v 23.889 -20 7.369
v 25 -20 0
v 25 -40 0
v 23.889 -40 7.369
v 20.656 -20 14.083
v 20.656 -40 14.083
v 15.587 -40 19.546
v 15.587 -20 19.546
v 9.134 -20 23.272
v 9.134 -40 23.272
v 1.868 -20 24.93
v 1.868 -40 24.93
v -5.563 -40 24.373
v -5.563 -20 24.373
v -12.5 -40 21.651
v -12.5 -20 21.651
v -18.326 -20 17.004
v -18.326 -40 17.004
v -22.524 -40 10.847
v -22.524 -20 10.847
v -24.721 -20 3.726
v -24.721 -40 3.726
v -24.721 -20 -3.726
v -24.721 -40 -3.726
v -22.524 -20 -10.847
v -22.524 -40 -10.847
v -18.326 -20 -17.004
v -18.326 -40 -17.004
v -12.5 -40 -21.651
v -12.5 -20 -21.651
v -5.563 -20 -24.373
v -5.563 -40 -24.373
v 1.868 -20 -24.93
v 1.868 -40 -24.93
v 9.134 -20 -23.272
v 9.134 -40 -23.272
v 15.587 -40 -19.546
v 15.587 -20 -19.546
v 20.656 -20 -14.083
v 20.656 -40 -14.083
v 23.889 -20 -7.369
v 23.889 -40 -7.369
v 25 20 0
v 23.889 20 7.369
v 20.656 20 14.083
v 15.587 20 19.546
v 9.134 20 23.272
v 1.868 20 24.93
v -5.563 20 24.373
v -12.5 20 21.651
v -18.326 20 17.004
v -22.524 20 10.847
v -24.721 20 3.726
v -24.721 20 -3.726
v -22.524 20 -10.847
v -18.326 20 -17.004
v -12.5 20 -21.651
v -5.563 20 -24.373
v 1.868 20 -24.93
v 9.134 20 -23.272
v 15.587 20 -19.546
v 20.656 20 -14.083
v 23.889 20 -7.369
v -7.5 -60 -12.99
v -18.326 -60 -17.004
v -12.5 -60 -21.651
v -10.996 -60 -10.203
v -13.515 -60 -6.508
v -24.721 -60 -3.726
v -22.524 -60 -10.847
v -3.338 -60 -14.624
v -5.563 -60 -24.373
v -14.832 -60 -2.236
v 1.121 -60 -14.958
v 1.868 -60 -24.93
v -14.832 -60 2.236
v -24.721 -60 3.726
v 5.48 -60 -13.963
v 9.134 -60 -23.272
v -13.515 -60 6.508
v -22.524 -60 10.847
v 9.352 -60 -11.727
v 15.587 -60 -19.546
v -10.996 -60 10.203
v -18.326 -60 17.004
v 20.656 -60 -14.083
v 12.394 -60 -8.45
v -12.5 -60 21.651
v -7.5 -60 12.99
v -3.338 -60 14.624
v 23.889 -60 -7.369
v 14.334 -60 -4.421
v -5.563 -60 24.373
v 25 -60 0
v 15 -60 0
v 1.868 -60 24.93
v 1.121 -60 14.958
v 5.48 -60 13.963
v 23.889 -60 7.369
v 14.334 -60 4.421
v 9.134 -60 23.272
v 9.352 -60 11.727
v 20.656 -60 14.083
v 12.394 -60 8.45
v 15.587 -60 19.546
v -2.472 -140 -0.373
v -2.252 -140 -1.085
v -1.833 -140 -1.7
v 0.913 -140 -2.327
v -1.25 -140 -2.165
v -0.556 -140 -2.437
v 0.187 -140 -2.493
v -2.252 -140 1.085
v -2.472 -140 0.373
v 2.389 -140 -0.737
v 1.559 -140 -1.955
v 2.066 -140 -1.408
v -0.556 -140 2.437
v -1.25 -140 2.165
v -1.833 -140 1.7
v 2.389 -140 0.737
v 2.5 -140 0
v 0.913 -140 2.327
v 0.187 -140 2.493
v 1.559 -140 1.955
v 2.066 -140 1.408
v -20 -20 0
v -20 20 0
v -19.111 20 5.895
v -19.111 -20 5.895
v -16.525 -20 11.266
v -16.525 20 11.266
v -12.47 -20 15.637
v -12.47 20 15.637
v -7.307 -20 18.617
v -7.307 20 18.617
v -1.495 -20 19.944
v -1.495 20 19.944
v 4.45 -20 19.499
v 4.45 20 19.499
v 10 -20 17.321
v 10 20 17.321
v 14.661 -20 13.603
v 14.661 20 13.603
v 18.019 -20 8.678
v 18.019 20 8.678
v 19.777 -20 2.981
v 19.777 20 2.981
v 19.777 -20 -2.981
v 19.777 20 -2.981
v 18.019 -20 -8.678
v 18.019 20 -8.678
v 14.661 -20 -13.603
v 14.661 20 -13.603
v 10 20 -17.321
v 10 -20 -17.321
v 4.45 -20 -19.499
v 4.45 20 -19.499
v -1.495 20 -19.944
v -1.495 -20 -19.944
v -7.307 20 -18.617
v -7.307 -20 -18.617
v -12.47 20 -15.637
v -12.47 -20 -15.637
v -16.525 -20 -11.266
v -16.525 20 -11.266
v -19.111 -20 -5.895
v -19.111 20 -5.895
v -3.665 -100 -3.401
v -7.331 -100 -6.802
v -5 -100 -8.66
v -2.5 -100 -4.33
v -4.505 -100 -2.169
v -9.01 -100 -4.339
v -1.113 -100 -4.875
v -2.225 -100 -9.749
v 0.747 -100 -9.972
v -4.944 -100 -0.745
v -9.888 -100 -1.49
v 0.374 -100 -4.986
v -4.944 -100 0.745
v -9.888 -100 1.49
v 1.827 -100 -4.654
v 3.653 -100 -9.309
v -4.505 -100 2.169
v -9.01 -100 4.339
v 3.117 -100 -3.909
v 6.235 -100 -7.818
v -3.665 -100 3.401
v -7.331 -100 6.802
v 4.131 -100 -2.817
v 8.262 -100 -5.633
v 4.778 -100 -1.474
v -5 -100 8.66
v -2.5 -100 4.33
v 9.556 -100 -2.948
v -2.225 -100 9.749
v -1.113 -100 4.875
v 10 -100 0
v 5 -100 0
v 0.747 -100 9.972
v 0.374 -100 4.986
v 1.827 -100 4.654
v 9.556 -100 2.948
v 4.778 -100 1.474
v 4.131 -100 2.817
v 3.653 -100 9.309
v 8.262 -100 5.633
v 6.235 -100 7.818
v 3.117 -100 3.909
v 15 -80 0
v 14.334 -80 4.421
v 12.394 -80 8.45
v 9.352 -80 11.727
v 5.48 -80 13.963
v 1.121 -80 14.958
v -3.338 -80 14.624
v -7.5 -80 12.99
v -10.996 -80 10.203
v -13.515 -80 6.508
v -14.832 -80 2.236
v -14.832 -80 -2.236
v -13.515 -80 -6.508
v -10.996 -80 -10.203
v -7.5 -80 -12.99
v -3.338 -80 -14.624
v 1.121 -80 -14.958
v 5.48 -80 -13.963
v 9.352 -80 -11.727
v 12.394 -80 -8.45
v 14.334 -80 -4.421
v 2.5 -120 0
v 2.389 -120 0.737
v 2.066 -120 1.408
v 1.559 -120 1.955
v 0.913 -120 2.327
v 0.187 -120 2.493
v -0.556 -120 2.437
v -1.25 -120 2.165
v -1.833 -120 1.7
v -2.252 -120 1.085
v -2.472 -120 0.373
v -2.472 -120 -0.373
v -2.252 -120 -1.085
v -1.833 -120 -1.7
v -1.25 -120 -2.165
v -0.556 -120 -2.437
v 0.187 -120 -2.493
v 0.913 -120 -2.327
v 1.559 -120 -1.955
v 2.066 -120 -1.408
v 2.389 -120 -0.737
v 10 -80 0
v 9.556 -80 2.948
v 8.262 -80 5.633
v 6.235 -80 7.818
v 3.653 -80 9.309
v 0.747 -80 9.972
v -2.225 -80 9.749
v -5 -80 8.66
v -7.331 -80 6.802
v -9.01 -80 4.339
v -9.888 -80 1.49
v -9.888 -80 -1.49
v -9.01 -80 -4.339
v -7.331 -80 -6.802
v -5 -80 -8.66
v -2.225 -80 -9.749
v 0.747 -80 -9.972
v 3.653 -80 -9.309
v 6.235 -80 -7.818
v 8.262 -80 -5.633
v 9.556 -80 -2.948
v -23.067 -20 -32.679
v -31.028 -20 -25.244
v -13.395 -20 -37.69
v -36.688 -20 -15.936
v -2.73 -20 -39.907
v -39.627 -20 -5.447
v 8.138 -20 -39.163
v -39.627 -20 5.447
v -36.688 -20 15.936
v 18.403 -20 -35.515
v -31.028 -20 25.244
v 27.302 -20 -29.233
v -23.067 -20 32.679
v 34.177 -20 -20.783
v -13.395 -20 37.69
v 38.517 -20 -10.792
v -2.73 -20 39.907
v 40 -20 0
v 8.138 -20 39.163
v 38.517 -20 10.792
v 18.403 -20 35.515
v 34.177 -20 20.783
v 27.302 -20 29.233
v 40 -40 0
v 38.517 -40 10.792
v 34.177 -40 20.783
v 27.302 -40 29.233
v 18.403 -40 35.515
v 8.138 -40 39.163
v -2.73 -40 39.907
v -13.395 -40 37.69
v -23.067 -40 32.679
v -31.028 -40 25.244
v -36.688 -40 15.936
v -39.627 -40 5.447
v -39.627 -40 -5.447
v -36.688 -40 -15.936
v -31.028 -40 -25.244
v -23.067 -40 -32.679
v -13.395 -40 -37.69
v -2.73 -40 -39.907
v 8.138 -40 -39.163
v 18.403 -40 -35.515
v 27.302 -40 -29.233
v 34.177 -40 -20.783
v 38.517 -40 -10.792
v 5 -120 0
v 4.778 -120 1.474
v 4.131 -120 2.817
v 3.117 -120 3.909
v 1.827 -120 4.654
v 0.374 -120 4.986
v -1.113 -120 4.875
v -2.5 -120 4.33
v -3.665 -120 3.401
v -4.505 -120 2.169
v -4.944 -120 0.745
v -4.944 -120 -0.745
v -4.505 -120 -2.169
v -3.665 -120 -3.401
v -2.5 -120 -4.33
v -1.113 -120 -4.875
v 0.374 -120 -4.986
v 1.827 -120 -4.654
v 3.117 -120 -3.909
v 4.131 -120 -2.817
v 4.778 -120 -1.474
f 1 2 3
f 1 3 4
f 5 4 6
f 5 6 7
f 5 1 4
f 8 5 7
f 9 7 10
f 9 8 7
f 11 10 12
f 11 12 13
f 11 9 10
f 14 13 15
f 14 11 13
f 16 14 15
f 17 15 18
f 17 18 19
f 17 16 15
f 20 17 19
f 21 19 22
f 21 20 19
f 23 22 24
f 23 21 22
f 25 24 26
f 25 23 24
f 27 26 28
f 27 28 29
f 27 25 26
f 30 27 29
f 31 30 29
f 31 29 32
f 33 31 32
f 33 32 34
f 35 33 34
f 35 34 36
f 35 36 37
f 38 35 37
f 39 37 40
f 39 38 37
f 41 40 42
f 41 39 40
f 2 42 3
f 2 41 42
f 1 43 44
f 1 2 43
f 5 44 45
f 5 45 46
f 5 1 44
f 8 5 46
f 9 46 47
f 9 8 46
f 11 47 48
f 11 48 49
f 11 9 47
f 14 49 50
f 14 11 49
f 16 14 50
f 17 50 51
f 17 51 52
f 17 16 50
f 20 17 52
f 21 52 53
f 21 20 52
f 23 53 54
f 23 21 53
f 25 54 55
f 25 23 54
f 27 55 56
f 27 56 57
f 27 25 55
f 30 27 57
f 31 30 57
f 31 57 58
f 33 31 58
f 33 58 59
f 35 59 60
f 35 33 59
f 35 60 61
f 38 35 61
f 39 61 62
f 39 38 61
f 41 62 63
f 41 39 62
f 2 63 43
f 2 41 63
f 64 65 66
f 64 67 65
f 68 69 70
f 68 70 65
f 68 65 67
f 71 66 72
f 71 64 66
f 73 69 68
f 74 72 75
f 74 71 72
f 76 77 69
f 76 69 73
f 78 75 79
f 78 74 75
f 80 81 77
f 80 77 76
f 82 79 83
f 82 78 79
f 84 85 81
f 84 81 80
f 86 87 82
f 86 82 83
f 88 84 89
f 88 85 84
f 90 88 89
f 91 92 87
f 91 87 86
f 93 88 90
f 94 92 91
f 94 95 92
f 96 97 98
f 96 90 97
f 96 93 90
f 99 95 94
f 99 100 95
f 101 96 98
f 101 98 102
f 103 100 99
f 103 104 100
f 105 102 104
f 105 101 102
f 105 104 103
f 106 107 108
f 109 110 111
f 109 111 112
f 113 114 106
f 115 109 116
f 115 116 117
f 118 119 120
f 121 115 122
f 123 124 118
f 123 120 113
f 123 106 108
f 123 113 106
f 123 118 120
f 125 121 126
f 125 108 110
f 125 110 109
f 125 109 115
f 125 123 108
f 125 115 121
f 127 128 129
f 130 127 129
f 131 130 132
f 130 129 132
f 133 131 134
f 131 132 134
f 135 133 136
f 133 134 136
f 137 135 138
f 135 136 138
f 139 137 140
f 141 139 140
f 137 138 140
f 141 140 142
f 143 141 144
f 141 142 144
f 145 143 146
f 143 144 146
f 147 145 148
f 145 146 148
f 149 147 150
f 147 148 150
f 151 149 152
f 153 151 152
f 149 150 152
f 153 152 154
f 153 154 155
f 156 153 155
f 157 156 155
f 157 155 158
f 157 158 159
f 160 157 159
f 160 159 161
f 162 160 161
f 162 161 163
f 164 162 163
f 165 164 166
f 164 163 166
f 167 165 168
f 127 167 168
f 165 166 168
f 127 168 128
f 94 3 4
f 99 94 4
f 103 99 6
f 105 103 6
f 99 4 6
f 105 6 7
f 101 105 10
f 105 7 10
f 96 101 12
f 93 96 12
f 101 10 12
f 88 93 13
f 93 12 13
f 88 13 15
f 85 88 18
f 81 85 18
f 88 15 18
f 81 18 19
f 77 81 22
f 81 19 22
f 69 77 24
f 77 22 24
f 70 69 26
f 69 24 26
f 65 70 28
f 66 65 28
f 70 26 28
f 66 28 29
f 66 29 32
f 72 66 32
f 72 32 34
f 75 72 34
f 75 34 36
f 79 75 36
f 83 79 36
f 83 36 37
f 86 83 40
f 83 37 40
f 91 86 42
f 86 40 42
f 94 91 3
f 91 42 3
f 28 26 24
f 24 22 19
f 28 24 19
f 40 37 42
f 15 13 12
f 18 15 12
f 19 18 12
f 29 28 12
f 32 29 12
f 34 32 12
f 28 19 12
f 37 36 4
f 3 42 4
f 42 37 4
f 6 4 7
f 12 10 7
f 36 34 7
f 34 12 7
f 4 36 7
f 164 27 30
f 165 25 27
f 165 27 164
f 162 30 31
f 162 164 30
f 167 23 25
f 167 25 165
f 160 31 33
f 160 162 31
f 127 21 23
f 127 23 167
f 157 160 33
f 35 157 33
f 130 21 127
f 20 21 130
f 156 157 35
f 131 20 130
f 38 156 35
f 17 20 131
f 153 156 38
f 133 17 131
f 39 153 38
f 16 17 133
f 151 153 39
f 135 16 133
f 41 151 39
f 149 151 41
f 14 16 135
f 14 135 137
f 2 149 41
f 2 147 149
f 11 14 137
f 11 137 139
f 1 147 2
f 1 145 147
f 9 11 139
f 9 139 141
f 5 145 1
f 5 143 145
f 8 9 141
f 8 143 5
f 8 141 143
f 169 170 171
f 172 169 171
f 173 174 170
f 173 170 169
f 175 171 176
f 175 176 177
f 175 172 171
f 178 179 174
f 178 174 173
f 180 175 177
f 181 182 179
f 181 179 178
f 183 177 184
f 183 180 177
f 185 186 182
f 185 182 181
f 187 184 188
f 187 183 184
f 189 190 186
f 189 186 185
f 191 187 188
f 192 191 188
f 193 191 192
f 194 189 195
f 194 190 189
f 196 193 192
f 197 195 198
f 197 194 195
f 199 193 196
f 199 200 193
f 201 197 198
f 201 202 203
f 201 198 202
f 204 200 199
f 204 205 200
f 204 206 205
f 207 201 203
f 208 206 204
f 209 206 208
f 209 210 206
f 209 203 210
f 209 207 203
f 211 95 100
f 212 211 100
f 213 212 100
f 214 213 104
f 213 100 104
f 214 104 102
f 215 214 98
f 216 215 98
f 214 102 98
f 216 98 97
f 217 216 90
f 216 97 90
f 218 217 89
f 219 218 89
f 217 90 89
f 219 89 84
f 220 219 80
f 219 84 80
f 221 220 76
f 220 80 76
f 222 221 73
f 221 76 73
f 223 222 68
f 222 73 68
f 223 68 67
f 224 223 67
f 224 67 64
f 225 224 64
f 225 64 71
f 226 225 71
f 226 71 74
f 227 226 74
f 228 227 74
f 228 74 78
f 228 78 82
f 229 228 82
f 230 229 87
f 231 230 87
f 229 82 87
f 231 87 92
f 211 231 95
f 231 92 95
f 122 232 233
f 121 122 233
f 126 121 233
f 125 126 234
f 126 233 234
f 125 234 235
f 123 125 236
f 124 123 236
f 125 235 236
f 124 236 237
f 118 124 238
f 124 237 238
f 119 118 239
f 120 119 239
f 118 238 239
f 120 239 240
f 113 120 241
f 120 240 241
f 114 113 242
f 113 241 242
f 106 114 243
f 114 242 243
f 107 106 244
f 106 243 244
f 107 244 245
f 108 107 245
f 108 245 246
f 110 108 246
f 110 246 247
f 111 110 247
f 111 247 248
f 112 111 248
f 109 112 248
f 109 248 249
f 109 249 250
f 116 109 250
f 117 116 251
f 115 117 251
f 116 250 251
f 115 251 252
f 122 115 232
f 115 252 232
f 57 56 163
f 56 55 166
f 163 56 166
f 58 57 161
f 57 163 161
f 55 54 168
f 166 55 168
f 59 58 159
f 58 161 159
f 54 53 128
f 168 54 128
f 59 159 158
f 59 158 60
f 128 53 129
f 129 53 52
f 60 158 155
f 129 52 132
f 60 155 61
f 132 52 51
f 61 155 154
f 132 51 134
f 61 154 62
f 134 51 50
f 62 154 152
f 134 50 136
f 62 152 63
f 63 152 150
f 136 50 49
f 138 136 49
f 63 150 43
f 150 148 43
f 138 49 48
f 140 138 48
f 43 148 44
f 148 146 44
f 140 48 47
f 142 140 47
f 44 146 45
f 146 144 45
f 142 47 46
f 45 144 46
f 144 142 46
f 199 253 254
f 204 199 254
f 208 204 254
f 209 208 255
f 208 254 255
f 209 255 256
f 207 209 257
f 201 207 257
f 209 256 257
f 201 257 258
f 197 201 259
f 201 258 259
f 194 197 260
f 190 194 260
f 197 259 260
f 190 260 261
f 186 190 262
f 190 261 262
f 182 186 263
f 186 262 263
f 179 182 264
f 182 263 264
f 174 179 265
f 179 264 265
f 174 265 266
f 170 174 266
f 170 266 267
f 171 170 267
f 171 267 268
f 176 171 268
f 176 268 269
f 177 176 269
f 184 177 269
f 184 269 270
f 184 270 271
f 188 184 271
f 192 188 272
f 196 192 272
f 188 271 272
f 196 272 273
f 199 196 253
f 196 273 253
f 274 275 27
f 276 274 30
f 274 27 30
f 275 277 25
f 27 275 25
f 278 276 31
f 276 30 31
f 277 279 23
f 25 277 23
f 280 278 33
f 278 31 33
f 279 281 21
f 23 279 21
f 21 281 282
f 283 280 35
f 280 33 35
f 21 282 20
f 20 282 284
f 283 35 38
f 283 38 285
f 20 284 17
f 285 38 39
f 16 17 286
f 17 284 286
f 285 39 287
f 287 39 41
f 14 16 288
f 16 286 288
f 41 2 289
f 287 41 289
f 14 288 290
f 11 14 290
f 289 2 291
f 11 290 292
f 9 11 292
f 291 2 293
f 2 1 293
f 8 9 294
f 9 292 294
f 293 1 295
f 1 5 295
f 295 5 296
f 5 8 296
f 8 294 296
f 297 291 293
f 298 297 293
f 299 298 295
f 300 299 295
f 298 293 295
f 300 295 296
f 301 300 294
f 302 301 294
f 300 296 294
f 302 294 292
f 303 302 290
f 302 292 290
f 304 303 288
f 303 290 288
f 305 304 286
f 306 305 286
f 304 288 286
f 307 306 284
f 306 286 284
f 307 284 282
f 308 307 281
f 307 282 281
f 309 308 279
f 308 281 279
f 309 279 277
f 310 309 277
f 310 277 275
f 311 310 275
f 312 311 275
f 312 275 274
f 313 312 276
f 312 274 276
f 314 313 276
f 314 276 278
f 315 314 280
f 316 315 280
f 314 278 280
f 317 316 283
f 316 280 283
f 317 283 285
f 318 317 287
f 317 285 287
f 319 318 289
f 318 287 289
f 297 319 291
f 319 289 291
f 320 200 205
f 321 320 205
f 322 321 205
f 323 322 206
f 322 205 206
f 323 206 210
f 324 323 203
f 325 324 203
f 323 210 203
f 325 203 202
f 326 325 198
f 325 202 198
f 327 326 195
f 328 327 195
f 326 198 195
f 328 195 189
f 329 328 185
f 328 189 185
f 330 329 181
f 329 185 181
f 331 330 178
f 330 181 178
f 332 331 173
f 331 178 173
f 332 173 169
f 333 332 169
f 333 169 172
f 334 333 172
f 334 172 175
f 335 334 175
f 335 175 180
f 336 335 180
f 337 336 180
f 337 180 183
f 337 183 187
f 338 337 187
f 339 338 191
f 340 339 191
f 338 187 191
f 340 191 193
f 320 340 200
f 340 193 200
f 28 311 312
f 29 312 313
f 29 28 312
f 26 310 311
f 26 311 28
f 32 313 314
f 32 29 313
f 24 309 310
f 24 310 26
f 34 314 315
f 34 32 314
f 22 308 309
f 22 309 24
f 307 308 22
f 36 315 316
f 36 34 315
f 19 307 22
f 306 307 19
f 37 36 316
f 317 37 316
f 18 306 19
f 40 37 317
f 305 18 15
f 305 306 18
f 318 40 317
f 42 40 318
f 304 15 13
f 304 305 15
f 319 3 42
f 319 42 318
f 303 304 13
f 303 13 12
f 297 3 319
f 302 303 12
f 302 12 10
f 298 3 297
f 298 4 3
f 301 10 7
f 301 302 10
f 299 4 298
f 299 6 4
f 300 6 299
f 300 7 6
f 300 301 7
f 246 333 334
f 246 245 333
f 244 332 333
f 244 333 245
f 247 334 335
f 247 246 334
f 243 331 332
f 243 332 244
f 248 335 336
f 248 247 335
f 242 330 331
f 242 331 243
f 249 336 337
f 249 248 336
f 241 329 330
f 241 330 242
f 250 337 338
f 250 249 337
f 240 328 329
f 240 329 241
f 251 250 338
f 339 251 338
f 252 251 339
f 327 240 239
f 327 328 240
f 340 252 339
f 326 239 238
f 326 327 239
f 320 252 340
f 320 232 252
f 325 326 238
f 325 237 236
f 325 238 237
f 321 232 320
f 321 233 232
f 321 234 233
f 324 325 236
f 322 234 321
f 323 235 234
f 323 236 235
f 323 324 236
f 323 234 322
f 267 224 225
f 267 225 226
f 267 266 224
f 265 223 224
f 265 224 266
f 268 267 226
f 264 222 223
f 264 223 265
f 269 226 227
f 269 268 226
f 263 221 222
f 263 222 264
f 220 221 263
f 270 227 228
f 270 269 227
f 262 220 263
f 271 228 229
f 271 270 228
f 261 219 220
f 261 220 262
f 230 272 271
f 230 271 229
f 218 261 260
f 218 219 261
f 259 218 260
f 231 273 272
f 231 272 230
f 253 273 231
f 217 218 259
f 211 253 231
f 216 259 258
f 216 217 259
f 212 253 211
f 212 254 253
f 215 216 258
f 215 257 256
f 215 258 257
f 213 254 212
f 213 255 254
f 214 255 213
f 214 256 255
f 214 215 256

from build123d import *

# Parameters (mm, degrees)
F0_R      = 25
F1_DEPTH  = 20
F2_DEPTH  = 20
F3_R      = 40
F3_R_2    = 25
F4_DEPTH  = 20
F5_R      = 25
F6_DEPTH  = 20
F7_R      = 20
F8_DEPTH  = 40
F9_R      = 15
F10_DEPTH = 20
F11_R     = 10
F12_DEPTH = 20
F13_R     = 5
F14_DEPTH = 20
F15_R     = 2.5
F16_DEPTH = 20


with BuildPart() as f1:
    # F0 (on Front) → F1 (new body)
    with BuildSketch(Plane.XZ):
        Circle(F0_R)
    extrude(amount=F1_DEPTH)

    # F2 (add): a face of the model
    f2_faces = [f1.faces().sort_by_distance(p)[0] for p in [
        (0, 0, 0),
    ]]
    extrude(f2_faces, amount=F2_DEPTH)

    # F7 (on face) → F8 (cut)
    with BuildSketch(Plane(origin=(0, 20, 0), x_dir=(-1, 0, 0), z_dir=(0, 1, 0))):
        Circle(F7_R)
    extrude(amount=-F8_DEPTH, mode=Mode.SUBTRACT)


with BuildPart() as f4:
    # F3 (on face) → F4 (new body)
    with BuildSketch(Plane.XZ.offset(20)):
        Circle(F3_R)
        Circle(F3_R_2, mode=Mode.SUBTRACT)
    extrude(amount=F4_DEPTH)


with BuildPart() as f6:
    # F5 (on face) → F6 (new body)
    with BuildSketch(Plane.XZ.offset(40)):
        Circle(F5_R)
    extrude(amount=F6_DEPTH)

    # F9 (on face) → F10 (join)
    with BuildSketch(Plane.XZ.offset(60)):
        Circle(F9_R)
    extrude(amount=F10_DEPTH)

    # F11 (on face) → F12 (join)
    with BuildSketch(Plane.XZ.offset(80)):
        Circle(F11_R)
    extrude(amount=F12_DEPTH)

    # F13 (on face) → F14 (join)
    with BuildSketch(Plane.XZ.offset(100)):
        Circle(F13_R)
    extrude(amount=F14_DEPTH)

    # F15 (on face) → F16 (join)
    with BuildSketch(Plane.XZ.offset(120)):
        Circle(F15_R)
    extrude(amount=F16_DEPTH)


solid = Compound([f1.part, f4.part, f6.part])
